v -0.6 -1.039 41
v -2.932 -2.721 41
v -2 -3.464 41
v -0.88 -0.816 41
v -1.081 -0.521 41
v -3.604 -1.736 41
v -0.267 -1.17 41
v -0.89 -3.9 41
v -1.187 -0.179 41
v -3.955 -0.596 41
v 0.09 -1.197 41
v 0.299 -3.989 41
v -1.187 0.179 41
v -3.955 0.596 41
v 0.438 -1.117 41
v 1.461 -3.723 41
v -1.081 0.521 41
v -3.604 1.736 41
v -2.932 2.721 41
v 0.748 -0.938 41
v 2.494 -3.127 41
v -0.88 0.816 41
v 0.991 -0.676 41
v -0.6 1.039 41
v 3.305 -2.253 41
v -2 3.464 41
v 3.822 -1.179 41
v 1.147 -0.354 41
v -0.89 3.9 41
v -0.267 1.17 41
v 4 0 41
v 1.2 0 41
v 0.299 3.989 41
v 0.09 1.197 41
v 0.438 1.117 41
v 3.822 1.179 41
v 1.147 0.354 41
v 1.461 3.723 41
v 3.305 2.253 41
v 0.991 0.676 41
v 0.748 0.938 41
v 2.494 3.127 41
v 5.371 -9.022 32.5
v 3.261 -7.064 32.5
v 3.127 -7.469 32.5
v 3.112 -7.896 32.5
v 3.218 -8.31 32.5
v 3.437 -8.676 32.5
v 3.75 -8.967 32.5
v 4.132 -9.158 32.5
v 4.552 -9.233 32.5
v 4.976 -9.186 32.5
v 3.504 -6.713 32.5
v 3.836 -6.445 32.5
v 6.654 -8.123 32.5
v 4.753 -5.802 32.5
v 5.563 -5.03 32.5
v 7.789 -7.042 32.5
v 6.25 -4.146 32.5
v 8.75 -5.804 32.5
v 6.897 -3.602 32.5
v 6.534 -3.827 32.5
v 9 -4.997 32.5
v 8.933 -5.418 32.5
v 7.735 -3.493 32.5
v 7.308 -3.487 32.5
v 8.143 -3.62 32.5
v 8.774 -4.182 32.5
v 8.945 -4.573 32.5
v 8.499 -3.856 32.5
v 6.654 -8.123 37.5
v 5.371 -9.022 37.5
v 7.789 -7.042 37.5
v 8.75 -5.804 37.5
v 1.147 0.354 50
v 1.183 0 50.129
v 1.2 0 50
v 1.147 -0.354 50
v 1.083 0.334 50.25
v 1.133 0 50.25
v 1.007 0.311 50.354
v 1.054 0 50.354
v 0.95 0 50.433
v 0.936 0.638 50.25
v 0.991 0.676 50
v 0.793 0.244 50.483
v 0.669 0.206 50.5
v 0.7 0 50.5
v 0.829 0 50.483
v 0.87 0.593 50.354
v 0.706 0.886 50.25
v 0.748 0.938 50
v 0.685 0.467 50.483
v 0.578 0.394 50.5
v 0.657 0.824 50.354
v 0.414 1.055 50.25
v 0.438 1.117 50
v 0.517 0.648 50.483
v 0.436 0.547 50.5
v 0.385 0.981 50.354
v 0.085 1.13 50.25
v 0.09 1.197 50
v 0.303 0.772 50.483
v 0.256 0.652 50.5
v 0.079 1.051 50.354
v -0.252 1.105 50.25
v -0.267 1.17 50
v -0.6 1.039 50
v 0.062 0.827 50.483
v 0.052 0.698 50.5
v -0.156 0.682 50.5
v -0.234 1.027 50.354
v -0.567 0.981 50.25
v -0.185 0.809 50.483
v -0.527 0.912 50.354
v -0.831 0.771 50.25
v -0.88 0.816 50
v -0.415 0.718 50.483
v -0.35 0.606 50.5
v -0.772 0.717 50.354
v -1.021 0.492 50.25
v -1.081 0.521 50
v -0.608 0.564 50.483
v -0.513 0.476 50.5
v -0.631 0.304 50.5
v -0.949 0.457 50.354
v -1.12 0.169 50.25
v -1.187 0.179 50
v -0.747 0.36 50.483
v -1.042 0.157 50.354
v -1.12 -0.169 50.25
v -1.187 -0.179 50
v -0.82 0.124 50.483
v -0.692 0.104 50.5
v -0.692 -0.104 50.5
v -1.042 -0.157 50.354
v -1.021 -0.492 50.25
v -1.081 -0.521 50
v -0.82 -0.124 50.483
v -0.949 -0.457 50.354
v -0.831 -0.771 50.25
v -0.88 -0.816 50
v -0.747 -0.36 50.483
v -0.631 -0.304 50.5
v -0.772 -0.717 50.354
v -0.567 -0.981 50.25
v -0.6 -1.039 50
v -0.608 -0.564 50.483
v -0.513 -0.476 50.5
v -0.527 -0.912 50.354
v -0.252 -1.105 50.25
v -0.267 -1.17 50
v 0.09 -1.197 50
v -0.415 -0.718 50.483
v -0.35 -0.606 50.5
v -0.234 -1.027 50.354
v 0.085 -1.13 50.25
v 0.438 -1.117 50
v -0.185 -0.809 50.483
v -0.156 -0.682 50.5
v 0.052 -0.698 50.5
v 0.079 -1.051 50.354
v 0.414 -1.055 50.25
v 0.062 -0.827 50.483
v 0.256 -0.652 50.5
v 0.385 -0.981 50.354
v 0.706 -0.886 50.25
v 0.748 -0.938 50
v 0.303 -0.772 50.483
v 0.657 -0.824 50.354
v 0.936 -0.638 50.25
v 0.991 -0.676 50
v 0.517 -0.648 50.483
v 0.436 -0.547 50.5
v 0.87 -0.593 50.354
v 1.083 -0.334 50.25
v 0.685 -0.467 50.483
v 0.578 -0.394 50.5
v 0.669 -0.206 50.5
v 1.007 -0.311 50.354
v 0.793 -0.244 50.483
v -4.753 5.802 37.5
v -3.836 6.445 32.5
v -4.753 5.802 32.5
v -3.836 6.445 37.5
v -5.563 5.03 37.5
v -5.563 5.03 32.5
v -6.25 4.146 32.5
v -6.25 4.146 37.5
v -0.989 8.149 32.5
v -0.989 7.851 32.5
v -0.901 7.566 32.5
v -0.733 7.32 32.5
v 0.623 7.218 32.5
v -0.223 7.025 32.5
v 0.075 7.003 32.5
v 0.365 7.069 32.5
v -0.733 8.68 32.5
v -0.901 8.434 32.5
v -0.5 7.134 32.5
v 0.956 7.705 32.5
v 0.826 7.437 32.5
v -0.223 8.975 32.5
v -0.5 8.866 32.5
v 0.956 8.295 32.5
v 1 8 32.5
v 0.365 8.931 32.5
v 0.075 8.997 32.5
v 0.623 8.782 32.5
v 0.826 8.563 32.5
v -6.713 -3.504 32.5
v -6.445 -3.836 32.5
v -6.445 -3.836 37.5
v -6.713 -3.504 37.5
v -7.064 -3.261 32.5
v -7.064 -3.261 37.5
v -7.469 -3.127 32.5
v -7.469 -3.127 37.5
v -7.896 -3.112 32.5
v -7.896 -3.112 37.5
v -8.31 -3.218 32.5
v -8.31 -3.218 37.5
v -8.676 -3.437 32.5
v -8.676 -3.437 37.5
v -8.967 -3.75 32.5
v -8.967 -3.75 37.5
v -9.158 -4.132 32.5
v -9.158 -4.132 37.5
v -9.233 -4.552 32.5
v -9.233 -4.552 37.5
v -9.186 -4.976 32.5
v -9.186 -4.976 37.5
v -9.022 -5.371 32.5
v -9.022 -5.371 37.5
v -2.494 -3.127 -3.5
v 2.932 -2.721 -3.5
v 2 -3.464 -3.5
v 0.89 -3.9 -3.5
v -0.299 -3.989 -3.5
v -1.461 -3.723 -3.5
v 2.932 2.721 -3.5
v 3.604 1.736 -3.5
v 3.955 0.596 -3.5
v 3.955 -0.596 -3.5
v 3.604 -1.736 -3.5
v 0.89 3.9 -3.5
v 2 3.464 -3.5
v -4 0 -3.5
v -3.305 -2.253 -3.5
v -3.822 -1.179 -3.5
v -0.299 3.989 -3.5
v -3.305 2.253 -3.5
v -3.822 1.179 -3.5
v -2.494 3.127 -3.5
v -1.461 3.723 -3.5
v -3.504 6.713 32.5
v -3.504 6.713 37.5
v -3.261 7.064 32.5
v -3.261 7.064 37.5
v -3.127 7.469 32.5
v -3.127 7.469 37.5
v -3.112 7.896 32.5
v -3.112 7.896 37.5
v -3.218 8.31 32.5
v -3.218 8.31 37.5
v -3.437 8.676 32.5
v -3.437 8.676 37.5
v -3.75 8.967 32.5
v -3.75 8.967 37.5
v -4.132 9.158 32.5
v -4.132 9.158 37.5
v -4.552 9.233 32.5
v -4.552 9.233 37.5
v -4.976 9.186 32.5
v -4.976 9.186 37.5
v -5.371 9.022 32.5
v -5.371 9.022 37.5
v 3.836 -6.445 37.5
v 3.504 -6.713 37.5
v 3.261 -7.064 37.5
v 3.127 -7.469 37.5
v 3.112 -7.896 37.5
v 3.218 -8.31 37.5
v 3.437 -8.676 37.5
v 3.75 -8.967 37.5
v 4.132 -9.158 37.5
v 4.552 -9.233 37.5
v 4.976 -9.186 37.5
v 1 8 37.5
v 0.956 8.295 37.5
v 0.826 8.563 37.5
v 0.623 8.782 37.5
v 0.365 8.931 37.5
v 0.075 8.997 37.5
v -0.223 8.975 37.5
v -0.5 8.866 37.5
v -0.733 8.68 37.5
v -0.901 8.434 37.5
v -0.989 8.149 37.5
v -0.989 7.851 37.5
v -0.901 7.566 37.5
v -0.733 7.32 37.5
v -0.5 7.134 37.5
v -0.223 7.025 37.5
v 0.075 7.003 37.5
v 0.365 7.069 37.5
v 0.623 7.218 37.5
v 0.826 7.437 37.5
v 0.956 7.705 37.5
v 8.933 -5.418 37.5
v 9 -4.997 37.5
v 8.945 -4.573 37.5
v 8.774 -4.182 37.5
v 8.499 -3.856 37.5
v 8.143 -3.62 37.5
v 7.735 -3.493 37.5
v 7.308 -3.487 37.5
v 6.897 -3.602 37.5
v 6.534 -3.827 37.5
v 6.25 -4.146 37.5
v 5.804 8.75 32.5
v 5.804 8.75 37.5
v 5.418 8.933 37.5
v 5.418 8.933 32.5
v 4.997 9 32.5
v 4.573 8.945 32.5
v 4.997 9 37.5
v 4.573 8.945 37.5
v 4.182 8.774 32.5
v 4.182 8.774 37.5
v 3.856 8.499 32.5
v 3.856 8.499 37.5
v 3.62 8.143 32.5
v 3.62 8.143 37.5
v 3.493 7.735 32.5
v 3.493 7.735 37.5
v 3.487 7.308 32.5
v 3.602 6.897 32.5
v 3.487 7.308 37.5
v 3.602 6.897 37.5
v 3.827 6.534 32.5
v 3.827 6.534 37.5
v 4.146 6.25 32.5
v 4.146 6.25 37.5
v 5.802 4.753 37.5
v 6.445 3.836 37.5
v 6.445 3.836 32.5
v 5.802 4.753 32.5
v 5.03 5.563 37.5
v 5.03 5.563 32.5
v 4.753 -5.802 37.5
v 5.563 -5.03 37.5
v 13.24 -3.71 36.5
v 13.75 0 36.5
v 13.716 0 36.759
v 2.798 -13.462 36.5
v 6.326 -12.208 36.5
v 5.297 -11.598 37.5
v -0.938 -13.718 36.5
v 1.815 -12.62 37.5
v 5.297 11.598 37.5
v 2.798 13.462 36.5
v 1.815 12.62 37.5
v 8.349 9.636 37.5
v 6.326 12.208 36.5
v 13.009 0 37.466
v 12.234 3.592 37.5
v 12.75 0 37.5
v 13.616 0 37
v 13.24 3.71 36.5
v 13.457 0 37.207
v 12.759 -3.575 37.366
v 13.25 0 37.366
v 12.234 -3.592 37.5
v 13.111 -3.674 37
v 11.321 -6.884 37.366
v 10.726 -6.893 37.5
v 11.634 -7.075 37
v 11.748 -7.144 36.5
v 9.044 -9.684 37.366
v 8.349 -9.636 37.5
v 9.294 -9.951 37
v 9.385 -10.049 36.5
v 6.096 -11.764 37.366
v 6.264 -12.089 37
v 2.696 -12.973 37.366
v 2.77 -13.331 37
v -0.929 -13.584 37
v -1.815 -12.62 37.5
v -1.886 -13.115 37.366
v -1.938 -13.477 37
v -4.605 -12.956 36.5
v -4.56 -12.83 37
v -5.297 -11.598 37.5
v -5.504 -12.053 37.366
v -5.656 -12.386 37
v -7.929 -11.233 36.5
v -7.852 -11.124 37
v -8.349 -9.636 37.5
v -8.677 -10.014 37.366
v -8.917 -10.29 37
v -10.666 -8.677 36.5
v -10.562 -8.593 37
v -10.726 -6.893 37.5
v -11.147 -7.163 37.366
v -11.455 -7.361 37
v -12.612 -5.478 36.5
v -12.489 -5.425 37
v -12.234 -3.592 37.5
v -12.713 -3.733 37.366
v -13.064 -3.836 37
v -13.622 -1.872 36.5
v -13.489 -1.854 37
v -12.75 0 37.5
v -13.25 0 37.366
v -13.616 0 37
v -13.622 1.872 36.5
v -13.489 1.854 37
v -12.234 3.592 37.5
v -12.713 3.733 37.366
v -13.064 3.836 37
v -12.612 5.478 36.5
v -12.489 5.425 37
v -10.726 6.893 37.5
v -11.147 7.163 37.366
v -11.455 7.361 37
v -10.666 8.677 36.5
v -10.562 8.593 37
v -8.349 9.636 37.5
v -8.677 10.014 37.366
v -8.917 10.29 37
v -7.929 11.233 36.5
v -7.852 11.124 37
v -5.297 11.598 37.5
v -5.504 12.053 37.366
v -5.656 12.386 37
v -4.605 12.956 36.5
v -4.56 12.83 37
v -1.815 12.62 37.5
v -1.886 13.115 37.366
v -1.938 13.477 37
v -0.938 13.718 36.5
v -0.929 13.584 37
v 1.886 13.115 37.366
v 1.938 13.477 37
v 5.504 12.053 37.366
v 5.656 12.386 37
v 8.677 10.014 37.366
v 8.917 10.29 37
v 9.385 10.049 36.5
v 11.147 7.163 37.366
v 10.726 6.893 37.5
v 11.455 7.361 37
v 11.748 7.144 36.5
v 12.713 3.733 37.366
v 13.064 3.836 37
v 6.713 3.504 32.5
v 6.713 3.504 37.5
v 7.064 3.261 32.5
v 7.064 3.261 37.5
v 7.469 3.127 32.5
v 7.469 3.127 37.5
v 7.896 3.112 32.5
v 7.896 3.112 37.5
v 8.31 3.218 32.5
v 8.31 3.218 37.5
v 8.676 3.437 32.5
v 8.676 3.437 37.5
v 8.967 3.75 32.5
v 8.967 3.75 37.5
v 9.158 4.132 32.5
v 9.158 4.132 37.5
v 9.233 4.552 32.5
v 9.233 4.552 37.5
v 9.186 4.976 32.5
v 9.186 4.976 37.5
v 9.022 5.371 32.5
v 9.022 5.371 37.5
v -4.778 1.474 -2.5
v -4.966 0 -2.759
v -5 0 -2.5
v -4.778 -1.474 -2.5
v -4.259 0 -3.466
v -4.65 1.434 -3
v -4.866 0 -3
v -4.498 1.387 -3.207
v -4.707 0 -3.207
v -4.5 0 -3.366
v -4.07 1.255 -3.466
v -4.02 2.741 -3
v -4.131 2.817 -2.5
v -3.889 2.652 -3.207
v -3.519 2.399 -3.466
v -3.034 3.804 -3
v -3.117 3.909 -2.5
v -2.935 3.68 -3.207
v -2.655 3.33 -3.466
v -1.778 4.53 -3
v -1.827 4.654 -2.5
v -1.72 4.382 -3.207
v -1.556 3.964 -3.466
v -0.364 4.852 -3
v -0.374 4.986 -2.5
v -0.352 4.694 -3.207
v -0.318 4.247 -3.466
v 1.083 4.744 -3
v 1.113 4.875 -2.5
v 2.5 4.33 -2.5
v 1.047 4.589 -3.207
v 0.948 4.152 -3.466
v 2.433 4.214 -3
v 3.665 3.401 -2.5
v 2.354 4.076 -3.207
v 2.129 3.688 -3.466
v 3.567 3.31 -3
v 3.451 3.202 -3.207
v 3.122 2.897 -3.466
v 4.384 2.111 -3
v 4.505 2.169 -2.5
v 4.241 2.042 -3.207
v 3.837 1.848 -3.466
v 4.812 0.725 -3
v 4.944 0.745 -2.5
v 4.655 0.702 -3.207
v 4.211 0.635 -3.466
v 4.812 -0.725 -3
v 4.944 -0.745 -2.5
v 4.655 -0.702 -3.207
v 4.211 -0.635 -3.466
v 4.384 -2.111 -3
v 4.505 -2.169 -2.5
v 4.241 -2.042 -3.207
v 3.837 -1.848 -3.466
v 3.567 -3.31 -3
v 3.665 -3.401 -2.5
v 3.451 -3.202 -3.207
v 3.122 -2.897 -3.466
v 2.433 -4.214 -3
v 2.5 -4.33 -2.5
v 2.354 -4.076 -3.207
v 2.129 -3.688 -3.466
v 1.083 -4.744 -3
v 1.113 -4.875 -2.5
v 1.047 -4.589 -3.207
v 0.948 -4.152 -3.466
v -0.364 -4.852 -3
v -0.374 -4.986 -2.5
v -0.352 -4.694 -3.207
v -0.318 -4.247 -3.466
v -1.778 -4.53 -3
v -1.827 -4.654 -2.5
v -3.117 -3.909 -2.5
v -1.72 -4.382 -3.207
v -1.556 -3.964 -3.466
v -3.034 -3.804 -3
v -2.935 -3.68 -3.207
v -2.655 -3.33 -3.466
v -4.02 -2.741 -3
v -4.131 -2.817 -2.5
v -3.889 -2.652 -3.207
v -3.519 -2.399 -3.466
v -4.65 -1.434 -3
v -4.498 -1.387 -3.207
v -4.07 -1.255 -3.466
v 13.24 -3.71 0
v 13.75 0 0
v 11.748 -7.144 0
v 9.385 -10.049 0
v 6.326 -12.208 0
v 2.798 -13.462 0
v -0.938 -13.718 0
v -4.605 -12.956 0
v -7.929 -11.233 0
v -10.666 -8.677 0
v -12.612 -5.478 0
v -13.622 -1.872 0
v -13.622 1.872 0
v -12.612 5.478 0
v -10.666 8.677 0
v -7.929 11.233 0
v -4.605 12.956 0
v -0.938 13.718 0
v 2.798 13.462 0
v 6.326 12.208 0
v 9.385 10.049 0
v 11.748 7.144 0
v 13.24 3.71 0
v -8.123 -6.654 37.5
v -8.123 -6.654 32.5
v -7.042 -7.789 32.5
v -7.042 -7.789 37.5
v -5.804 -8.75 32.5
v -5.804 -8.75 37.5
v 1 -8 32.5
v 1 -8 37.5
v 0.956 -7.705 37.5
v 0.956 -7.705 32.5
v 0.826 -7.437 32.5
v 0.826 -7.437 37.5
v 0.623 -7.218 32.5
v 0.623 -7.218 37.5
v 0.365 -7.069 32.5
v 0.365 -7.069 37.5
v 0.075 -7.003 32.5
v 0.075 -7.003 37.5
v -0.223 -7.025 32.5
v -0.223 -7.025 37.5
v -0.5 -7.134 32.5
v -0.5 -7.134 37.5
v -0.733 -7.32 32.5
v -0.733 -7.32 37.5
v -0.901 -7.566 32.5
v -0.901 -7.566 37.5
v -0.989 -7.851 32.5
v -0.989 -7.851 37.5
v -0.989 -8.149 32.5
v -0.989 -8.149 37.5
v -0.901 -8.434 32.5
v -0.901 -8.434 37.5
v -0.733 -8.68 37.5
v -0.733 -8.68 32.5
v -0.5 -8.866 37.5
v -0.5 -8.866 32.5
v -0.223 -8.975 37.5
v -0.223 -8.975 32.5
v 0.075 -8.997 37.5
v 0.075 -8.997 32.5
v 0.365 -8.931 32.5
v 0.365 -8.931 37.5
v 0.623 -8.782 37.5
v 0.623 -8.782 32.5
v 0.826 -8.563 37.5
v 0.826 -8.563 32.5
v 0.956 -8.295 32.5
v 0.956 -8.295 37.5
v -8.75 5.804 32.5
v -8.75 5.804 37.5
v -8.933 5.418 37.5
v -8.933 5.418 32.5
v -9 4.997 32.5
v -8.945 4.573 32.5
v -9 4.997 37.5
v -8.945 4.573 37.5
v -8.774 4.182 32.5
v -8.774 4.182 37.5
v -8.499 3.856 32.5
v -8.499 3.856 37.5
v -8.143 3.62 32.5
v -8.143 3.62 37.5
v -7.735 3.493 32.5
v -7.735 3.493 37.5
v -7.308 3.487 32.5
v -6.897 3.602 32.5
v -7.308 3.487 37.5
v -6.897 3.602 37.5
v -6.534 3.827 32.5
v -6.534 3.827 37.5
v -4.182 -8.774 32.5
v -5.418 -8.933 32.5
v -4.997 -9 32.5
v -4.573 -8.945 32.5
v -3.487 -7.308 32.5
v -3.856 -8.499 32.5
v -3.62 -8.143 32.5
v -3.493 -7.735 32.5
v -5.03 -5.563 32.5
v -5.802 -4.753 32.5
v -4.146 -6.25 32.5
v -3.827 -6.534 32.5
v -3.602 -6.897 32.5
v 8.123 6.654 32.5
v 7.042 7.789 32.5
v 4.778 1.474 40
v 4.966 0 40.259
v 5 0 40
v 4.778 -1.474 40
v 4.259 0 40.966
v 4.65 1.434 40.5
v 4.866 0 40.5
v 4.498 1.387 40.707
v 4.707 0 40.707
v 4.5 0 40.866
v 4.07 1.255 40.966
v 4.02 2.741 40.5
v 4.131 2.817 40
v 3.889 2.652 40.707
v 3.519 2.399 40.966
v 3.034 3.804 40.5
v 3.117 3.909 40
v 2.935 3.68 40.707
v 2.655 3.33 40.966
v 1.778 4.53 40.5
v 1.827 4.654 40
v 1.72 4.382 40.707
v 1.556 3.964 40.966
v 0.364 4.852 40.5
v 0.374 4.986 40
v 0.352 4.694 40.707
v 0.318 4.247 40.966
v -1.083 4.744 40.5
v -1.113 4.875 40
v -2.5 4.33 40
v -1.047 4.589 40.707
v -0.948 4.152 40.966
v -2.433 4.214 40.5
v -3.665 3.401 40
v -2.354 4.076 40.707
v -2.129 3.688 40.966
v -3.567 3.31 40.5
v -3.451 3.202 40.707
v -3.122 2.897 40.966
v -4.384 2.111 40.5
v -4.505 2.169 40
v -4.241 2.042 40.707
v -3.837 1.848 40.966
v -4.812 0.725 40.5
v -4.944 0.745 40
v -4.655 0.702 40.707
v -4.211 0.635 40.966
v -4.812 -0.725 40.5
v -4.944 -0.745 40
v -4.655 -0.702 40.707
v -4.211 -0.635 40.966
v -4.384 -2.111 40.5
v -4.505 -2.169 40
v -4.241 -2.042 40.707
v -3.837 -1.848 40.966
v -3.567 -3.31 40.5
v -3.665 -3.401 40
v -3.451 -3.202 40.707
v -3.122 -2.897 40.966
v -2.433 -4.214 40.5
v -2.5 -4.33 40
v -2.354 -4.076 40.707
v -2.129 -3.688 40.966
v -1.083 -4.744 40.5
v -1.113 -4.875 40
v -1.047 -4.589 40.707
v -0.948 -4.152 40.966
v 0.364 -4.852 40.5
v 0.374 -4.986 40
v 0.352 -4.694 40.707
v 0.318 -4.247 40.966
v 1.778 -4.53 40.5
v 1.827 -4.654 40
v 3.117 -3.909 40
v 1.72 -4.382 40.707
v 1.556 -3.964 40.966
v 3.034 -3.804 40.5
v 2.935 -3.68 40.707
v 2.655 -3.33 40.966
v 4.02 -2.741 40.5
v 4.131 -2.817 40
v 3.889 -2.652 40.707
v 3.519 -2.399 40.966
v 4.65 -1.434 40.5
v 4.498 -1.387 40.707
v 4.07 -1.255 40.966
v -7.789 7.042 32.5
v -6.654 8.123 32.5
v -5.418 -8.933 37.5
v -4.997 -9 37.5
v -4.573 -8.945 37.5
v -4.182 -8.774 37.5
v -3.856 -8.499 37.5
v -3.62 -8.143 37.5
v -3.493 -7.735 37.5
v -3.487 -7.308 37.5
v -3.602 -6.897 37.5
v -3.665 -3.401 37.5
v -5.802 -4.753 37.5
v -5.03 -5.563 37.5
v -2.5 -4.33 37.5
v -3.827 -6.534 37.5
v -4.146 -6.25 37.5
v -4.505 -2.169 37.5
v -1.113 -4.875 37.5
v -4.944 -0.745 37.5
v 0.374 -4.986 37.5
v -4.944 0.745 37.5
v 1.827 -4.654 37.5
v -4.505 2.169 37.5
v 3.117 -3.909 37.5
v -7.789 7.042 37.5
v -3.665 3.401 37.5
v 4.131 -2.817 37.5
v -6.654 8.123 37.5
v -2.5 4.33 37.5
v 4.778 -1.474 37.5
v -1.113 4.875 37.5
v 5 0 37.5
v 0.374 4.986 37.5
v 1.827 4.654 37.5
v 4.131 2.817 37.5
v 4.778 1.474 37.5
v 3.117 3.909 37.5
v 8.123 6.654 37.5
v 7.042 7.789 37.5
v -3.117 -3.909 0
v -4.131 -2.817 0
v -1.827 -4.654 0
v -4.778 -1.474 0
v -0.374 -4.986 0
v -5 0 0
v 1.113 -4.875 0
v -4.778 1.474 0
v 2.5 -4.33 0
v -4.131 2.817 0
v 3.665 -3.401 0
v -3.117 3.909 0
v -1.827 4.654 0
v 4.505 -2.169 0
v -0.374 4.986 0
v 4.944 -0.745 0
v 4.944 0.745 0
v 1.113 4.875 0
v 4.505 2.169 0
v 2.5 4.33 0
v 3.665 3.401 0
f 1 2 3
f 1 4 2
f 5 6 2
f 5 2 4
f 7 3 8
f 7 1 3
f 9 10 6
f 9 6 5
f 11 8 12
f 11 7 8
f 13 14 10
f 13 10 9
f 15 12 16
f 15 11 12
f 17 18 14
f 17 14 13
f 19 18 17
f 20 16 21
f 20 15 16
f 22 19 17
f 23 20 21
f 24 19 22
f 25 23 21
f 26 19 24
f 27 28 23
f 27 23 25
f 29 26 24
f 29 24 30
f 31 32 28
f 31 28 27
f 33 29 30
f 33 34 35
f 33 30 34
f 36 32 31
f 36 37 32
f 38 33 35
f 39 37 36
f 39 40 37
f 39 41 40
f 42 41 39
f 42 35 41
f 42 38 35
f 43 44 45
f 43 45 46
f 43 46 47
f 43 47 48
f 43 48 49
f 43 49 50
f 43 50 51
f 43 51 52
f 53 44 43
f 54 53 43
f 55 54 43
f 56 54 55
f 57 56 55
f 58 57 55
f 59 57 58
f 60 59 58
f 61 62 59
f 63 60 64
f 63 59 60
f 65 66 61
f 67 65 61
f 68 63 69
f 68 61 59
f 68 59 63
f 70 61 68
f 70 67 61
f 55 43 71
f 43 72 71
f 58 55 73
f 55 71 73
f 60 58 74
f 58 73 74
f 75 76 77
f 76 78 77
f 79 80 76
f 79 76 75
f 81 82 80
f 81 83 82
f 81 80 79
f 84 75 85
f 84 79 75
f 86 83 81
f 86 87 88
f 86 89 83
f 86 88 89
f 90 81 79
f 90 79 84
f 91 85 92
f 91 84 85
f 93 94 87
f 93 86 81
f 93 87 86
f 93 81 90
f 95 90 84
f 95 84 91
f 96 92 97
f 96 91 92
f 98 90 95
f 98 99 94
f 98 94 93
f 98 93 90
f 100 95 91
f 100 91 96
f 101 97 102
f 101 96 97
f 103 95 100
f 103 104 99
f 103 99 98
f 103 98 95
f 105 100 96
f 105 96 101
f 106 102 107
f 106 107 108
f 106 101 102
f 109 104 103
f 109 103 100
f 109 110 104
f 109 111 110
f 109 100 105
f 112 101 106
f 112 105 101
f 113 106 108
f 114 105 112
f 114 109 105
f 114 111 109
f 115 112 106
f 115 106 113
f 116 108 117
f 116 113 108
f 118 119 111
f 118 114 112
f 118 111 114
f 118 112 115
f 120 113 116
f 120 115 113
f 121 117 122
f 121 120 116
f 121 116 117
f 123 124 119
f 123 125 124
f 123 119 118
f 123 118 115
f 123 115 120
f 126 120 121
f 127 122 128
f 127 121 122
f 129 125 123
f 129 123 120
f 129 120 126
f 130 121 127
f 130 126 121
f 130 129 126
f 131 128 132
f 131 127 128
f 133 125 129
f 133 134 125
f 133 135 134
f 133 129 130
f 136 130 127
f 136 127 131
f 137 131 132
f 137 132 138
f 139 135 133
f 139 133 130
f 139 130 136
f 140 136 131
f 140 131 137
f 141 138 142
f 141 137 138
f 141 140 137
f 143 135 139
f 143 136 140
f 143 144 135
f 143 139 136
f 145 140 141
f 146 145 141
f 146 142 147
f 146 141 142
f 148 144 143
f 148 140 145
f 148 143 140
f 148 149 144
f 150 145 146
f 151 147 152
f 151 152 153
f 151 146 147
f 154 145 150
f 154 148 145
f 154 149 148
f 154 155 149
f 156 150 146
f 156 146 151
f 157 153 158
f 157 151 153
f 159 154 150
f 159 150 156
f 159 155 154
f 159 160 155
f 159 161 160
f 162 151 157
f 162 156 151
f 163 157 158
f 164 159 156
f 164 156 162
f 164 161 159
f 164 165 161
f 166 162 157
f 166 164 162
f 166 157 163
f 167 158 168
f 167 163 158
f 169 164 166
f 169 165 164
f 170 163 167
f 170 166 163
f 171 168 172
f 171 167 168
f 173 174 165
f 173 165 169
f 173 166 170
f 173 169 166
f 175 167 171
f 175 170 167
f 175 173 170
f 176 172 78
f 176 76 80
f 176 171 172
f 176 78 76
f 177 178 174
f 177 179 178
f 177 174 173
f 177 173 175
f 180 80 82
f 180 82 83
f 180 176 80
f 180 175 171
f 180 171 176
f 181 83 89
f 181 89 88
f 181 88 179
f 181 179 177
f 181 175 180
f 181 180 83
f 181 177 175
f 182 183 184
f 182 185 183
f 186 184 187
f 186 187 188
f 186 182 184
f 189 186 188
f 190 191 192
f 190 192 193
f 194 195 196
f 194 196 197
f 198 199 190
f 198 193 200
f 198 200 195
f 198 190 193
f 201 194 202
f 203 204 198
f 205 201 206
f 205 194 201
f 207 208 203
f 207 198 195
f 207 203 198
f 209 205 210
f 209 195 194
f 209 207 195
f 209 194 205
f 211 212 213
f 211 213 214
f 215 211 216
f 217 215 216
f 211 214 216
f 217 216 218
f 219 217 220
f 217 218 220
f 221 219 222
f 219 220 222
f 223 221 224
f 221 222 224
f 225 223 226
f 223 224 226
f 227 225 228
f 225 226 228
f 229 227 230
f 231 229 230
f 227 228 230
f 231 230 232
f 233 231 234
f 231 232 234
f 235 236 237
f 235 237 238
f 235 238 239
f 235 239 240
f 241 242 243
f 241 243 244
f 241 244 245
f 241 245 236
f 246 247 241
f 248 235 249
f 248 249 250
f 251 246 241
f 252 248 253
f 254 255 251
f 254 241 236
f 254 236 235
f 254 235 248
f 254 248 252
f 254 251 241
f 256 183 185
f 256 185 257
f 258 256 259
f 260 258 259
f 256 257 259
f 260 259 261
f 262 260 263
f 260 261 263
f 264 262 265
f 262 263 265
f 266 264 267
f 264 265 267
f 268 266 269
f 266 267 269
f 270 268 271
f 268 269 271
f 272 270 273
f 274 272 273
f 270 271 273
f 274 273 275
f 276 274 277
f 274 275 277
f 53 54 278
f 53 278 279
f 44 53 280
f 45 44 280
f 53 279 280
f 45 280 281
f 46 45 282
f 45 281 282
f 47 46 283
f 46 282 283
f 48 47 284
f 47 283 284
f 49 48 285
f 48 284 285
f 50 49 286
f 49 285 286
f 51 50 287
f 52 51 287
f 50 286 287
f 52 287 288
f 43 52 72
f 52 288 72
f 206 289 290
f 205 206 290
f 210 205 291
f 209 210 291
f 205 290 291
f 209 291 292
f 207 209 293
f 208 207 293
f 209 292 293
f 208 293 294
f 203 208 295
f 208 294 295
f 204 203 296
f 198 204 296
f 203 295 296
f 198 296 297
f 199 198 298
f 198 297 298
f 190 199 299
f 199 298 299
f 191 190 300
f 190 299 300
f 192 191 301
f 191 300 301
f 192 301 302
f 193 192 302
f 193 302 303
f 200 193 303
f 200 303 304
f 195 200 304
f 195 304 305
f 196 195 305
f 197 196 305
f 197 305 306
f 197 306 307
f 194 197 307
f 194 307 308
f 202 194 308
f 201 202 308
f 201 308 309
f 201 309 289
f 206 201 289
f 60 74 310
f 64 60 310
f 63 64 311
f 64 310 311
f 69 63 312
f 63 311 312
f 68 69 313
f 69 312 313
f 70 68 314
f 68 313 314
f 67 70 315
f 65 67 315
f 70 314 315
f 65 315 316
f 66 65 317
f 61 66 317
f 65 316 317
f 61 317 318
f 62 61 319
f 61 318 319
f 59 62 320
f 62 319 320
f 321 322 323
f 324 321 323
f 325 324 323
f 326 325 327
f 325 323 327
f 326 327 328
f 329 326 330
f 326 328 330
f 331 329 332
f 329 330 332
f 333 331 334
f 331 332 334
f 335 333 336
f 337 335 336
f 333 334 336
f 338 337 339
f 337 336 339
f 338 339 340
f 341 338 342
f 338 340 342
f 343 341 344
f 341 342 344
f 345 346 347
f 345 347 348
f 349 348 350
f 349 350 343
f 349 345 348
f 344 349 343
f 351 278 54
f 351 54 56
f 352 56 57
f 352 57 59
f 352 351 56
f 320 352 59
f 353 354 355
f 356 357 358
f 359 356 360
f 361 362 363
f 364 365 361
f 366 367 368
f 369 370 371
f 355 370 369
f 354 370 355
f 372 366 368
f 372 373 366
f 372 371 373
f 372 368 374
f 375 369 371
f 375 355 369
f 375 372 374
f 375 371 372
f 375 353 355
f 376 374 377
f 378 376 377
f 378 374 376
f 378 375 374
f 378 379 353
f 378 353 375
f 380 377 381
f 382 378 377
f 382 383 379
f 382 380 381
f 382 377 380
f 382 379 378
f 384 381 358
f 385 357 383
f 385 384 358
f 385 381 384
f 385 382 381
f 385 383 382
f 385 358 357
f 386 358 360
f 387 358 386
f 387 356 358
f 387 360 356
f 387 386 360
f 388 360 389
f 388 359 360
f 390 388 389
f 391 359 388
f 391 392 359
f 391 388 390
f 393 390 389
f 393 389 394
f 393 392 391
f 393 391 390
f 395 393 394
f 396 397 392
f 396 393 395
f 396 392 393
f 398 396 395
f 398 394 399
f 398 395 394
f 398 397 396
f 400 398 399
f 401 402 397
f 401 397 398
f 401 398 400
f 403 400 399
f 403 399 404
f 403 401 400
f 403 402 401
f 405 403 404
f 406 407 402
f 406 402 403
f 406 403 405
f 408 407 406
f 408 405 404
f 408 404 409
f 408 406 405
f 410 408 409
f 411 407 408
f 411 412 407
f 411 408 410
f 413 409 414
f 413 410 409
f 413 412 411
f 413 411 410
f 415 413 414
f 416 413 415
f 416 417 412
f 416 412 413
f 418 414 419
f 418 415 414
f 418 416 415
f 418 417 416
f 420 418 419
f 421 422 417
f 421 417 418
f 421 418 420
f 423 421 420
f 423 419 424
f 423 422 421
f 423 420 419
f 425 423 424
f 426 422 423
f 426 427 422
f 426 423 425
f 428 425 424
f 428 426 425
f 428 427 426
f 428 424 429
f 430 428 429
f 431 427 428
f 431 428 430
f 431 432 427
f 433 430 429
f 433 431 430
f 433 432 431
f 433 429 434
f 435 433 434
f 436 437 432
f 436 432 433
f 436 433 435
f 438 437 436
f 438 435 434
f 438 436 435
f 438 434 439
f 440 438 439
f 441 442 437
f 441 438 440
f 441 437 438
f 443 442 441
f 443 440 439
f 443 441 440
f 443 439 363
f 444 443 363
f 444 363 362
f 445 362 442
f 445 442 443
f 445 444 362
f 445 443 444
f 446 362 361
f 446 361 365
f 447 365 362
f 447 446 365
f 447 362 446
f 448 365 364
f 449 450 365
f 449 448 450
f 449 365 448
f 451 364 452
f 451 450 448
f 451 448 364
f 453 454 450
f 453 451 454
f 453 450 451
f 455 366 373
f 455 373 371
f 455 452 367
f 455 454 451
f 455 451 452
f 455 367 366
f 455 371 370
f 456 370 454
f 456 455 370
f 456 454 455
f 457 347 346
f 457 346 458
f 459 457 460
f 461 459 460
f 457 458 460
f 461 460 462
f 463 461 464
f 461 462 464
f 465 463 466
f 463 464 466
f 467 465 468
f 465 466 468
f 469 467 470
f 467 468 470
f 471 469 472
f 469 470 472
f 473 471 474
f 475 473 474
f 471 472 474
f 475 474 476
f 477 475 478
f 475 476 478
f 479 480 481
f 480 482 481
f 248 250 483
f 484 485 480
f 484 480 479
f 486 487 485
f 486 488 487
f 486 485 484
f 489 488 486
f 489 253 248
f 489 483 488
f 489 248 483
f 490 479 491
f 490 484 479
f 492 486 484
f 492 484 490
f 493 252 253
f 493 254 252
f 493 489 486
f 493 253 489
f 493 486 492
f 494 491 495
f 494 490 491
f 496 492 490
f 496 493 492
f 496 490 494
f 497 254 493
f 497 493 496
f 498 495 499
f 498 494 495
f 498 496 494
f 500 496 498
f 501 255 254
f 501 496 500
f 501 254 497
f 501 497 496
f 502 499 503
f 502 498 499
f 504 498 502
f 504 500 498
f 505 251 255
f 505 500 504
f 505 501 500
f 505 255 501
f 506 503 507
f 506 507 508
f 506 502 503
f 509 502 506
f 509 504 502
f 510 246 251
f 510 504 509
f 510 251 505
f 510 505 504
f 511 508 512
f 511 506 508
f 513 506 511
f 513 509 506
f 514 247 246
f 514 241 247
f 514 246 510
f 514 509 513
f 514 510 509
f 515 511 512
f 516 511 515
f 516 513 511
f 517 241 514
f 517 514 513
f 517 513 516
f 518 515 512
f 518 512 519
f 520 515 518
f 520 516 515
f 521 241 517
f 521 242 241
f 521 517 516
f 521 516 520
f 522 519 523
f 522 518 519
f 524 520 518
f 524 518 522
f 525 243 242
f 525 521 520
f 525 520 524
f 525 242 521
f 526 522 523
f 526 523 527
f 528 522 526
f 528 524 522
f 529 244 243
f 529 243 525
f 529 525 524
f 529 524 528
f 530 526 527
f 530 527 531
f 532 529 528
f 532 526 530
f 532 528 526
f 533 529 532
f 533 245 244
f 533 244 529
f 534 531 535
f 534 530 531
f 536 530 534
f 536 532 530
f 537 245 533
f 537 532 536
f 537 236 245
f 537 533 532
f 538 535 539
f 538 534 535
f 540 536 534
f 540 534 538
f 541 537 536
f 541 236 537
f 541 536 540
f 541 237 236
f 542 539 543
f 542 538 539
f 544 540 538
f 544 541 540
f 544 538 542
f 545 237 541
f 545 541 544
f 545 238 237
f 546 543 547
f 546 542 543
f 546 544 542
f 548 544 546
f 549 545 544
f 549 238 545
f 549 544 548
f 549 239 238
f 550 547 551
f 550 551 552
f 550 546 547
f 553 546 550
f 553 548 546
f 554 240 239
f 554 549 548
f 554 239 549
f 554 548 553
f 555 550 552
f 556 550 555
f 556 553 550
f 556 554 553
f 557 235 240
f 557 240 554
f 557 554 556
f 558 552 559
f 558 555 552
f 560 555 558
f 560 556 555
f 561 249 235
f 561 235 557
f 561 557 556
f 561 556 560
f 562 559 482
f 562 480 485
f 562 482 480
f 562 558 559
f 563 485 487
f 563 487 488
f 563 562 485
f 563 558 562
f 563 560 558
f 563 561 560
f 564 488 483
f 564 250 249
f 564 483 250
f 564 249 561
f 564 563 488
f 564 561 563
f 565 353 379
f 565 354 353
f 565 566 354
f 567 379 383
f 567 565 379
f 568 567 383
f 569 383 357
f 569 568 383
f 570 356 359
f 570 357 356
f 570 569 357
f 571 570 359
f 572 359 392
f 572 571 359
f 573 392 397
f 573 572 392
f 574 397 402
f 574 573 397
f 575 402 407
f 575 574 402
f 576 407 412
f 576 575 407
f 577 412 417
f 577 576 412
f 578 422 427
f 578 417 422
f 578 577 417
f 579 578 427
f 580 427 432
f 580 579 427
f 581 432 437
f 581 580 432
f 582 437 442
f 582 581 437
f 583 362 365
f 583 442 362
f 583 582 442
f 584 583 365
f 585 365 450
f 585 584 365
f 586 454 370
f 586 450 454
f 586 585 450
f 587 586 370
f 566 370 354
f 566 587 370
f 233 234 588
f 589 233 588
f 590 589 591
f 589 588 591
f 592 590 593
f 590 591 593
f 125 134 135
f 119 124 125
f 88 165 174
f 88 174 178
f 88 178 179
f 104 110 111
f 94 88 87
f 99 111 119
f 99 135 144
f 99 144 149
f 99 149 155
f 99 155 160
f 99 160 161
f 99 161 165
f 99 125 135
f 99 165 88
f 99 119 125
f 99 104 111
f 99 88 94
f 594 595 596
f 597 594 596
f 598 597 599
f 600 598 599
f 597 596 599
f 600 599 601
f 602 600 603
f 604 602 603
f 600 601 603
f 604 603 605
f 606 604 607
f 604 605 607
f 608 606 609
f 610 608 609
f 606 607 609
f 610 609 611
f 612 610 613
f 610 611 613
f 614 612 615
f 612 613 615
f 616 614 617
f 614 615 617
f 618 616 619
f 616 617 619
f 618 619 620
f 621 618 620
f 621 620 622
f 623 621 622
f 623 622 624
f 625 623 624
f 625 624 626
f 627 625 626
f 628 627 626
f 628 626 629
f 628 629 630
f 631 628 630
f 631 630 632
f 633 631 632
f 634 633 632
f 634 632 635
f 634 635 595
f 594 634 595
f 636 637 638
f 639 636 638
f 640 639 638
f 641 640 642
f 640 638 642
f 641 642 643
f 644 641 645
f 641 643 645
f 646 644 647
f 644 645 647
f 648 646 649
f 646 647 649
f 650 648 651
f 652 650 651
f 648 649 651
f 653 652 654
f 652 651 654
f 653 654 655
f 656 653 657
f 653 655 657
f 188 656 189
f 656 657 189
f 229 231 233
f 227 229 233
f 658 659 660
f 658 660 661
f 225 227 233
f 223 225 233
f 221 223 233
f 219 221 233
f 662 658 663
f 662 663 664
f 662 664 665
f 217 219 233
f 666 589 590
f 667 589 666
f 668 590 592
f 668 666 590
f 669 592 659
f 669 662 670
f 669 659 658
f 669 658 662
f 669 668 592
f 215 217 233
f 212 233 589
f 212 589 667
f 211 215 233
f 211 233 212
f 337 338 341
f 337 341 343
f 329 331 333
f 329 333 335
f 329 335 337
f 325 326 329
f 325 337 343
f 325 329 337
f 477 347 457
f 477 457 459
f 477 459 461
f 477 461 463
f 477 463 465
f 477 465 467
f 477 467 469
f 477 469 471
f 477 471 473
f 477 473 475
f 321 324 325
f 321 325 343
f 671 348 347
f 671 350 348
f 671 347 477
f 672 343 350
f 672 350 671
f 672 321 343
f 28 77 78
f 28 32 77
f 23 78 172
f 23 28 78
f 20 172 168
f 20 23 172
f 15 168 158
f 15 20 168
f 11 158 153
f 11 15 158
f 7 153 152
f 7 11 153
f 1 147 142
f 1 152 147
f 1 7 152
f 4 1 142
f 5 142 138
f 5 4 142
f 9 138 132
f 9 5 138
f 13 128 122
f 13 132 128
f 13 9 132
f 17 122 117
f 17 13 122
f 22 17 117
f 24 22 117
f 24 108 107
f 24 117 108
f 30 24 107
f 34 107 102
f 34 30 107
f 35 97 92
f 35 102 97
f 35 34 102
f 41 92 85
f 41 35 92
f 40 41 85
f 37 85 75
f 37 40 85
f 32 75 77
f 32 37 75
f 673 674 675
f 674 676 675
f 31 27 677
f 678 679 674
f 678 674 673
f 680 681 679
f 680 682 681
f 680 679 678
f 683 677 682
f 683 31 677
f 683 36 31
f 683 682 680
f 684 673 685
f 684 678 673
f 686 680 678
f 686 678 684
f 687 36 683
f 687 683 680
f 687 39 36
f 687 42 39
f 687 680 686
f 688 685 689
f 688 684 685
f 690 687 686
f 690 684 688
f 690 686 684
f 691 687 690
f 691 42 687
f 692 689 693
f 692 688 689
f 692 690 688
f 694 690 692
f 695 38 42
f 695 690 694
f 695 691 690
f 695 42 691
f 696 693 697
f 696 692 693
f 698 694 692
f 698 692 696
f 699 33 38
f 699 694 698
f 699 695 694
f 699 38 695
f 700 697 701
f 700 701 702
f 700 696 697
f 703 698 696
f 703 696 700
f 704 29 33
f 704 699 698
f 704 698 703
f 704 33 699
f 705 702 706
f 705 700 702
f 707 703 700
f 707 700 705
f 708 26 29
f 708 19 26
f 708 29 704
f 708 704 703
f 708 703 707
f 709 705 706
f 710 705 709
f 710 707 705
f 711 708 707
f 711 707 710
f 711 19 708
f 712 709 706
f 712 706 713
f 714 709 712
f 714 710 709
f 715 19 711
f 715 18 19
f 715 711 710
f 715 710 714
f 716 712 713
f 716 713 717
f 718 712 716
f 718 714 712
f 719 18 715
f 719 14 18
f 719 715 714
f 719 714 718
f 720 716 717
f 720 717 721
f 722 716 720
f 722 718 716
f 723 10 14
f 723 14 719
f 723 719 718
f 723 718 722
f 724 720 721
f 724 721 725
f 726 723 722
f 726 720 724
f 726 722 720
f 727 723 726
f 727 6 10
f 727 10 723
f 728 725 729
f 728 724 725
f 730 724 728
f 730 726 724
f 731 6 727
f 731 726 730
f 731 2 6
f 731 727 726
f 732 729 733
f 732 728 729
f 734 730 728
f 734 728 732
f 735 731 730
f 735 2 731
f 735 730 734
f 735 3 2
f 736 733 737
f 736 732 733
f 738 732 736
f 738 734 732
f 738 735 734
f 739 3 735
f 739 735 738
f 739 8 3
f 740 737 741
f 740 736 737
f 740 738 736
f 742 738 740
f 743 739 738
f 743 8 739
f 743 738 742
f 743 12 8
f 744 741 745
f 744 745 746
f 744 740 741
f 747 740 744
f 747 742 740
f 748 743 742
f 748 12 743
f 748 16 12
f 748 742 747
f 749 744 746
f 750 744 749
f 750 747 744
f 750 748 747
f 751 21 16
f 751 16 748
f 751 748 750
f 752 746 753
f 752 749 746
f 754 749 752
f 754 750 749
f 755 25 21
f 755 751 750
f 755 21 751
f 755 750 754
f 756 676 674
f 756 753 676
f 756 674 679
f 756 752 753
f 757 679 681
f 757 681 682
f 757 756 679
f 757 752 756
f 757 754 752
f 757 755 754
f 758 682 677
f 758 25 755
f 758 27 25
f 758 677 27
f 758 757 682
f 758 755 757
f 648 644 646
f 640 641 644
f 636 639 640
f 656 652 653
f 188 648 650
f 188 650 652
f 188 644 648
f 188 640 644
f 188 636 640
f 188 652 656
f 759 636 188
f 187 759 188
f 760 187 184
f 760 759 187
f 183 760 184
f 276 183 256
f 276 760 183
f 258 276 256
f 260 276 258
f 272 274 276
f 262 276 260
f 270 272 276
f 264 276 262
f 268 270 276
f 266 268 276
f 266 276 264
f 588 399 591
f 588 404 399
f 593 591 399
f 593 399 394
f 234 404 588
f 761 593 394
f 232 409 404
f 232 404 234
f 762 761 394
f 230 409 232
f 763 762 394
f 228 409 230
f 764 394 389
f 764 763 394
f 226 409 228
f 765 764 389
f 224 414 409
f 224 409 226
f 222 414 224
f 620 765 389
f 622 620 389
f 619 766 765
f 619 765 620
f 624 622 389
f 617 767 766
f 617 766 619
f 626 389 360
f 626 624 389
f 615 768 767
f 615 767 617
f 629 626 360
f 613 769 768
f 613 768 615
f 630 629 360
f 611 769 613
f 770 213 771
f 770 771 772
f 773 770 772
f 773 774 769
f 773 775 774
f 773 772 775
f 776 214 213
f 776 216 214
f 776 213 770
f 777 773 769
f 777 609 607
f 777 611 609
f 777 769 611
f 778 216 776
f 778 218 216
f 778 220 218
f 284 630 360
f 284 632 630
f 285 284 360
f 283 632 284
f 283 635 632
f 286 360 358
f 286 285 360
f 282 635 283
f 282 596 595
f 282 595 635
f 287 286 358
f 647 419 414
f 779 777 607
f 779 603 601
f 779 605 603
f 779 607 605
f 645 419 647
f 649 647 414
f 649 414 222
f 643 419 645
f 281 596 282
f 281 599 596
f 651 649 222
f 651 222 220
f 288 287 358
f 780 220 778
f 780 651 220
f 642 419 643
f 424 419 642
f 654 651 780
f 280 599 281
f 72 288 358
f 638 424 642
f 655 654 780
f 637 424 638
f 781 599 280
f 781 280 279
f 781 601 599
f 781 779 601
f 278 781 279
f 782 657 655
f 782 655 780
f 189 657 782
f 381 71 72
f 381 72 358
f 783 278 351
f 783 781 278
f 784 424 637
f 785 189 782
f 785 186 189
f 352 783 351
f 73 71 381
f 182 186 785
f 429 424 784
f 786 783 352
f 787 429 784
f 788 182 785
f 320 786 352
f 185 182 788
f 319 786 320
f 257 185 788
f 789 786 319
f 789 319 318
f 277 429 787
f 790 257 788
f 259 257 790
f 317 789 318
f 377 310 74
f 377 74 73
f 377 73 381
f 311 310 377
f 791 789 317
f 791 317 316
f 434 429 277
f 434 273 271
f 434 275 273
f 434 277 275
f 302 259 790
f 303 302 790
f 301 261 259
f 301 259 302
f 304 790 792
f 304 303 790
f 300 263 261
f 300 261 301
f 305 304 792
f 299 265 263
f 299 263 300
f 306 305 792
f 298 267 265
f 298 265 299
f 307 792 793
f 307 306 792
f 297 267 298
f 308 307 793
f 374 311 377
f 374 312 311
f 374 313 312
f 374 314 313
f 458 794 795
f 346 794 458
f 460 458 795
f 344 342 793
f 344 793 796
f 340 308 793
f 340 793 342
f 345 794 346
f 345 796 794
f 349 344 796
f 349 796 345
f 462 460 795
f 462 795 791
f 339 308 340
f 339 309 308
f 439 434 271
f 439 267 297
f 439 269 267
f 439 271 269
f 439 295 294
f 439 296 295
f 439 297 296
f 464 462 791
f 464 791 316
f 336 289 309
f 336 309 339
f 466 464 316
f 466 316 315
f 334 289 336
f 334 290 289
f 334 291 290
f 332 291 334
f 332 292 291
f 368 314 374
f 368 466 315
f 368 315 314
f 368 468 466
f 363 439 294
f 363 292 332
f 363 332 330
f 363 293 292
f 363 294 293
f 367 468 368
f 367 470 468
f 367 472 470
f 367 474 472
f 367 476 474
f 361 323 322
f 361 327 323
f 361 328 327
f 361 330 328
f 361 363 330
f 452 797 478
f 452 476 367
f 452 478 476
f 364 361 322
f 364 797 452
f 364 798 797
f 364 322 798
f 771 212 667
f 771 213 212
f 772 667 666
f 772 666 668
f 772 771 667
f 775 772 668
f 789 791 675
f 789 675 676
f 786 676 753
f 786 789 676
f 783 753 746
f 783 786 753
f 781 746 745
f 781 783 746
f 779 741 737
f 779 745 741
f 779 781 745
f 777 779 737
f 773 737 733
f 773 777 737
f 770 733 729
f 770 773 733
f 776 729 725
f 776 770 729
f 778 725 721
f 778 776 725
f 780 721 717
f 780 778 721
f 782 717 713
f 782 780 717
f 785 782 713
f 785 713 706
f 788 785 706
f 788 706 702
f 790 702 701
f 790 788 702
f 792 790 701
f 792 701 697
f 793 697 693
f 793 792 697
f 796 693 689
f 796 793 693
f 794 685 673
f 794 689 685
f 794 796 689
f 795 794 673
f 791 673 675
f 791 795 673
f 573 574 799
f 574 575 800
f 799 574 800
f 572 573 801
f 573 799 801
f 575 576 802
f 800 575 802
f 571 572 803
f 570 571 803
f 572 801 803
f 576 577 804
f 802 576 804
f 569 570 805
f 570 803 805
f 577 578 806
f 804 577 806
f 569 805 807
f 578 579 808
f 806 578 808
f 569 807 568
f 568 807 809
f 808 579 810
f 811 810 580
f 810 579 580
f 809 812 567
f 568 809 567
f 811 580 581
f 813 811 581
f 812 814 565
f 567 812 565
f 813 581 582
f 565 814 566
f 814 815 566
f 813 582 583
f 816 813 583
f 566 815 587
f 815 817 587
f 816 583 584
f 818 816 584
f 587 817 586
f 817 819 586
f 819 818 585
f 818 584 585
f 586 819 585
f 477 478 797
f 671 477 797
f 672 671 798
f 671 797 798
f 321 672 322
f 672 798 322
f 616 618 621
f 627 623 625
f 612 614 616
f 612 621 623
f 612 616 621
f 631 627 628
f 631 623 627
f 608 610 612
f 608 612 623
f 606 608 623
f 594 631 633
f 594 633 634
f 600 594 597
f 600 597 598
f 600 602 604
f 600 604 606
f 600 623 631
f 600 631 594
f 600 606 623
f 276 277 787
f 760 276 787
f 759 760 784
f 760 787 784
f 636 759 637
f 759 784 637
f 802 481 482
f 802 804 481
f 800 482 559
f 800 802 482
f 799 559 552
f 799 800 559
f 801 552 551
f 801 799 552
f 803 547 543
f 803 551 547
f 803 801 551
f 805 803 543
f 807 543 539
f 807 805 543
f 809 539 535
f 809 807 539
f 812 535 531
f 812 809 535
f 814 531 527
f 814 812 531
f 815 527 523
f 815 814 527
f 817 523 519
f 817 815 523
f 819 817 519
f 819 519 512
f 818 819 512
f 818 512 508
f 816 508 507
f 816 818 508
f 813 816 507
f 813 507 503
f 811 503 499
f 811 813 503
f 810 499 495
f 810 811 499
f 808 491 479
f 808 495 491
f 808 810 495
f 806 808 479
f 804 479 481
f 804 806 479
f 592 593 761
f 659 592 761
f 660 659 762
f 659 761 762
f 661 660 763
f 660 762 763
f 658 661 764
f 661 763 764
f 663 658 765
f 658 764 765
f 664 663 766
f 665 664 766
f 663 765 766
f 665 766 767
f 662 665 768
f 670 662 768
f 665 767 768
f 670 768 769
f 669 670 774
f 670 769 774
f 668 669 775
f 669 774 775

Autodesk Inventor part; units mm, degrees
ref_plane "YZ Plane" through (0, 0, 0) normal (1, 0, 0) x (0, 1, 0)
ref_plane "XZ Plane" through (0, 0, 0) normal (0, 1, 0) x (-1, 0, 0)
ref_plane "XY Plane" through (0, 0, 0) normal (0, 0, 1) x (1, 0, 0)
sketch "Esquisse1" plane through (0, 0, 0) normal (0, 0, 1) x (1, 0, 0)
  circle A0 centre (0, 0) radius 13.75
  dimension "d0" = 27.5
extrude "Extrusion1" add sketch "Esquisse1" along normal blind 37.5
sketch "Esquisse2" plane through (0, 0, 0) normal (0, 0, -1) x (-1, 0, 0)
  circle A0 centre (0, 0) radius 5
  dimension "d3" = 10
extrude "Extrusion2" add sketch "Esquisse2" along normal blind 3.5
sketch "Esquisse3" plane through (0, 0, 37.5) normal (0, 0, 1) x (1, 0, 0)
  circle A0 centre (0, 0) radius 1.2
  dimension "d6" = 2.4
extrude "Extrusion3" add sketch "Esquisse3" along normal blind 13
sketch "Esquisse4" plane through (0, 0, 37.5) normal (0, 0, 1) x (1, 0, 0)
  circle A0 centre (0, 0) radius 1.2 projected
  circle A1 centre (0, 0) radius 5
  dimension "d9" = 10
extrude "Extrusion4" add sketch "Esquisse4" along normal blind 3.5
fillet "Congé1" radius 1 2 edges at (-5, 0, 41) (5, 0, -3.5)
fillet "Congé2" radius 1 1 edges at (-13.75, 0, 37.5)
fillet "Congé3" radius 0.5 1 edges at (-1.2, 0, 50.5)
sketch "Esquisse5" plane through (0, 0, 37.5) normal (0, 0, 1) x (1, 0, 0)
  circle A0 centre (0, 8) radius 1
  arc A1 (7.7336, 4.6035) -> (4.9749, 7.5) centre (0, 0) ccw construction
  arc A2 (9.0225, 5.3707) -> (5.8041, 8.75) centre (0, 0) ccw
  arc A3 (6.4446, 3.8362) -> (4.1458, 6.25) centre (0, 0) ccw
  arc A4 (6.4446, 3.8362) -> (9.0225, 5.3707) centre (7.7336, 4.6035) ccw
  arc A5 (5.8041, 8.75) -> (4.1458, 6.25) centre (4.9749, 7.5) ccw
  line L0 (0, 0) -> (0, 21.7918) construction
  circle A6 centre (0, -8) radius 1
  arc A7 (8.75, -5.8041) -> (6.25, -4.1458) centre (7.5, -4.9749) ccw
  arc A8 (5.3707, -9.0225) -> (8.75, -5.8041) centre (0, 0) ccw
  arc A9 (3.8362, -6.4446) -> (5.3707, -9.0225) centre (4.6035, -7.7336) ccw
  arc A10 (3.8362, -6.4446) -> (6.25, -4.1458) centre (0, 0) ccw
  arc A11 (-5.8041, -8.75) -> (-4.1458, -6.25) centre (-4.9749, -7.5) ccw
  arc A12 (-9.0225, -5.3707) -> (-5.8041, -8.75) centre (0, 0) ccw
  arc A13 (-6.4446, -3.8362) -> (-9.0225, -5.3707) centre (-7.7336, -4.6035) ccw
  arc A14 (-6.4446, -3.8362) -> (-4.1458, -6.25) centre (0, 0) ccw
  arc A15 (-8.75, 5.8041) -> (-6.25, 4.1458) centre (-7.5, 4.9749) ccw
  arc A16 (-5.3707, 9.0225) -> (-8.75, 5.8041) centre (0, 0) ccw
  arc A17 (-3.8362, 6.4446) -> (-5.3707, 9.0225) centre (-4.6035, 7.7336) ccw
  arc A18 (-3.8362, 6.4446) -> (-6.25, 4.1458) centre (0, 0) ccw
  dimension "d15" = 2
  dimension "d16" = 3
  dimension "d17" = 8
  dimension "d19" = 7
  dimension "d21" = 5
  dimension "d22" = 9
  dimension "d25" = 360
  dimension "d29" = 360
extrude "Extrusion5" cut sketch "Esquisse5" against normal blind 5
properties part number "Moteur" material "Acier inoxydable"
